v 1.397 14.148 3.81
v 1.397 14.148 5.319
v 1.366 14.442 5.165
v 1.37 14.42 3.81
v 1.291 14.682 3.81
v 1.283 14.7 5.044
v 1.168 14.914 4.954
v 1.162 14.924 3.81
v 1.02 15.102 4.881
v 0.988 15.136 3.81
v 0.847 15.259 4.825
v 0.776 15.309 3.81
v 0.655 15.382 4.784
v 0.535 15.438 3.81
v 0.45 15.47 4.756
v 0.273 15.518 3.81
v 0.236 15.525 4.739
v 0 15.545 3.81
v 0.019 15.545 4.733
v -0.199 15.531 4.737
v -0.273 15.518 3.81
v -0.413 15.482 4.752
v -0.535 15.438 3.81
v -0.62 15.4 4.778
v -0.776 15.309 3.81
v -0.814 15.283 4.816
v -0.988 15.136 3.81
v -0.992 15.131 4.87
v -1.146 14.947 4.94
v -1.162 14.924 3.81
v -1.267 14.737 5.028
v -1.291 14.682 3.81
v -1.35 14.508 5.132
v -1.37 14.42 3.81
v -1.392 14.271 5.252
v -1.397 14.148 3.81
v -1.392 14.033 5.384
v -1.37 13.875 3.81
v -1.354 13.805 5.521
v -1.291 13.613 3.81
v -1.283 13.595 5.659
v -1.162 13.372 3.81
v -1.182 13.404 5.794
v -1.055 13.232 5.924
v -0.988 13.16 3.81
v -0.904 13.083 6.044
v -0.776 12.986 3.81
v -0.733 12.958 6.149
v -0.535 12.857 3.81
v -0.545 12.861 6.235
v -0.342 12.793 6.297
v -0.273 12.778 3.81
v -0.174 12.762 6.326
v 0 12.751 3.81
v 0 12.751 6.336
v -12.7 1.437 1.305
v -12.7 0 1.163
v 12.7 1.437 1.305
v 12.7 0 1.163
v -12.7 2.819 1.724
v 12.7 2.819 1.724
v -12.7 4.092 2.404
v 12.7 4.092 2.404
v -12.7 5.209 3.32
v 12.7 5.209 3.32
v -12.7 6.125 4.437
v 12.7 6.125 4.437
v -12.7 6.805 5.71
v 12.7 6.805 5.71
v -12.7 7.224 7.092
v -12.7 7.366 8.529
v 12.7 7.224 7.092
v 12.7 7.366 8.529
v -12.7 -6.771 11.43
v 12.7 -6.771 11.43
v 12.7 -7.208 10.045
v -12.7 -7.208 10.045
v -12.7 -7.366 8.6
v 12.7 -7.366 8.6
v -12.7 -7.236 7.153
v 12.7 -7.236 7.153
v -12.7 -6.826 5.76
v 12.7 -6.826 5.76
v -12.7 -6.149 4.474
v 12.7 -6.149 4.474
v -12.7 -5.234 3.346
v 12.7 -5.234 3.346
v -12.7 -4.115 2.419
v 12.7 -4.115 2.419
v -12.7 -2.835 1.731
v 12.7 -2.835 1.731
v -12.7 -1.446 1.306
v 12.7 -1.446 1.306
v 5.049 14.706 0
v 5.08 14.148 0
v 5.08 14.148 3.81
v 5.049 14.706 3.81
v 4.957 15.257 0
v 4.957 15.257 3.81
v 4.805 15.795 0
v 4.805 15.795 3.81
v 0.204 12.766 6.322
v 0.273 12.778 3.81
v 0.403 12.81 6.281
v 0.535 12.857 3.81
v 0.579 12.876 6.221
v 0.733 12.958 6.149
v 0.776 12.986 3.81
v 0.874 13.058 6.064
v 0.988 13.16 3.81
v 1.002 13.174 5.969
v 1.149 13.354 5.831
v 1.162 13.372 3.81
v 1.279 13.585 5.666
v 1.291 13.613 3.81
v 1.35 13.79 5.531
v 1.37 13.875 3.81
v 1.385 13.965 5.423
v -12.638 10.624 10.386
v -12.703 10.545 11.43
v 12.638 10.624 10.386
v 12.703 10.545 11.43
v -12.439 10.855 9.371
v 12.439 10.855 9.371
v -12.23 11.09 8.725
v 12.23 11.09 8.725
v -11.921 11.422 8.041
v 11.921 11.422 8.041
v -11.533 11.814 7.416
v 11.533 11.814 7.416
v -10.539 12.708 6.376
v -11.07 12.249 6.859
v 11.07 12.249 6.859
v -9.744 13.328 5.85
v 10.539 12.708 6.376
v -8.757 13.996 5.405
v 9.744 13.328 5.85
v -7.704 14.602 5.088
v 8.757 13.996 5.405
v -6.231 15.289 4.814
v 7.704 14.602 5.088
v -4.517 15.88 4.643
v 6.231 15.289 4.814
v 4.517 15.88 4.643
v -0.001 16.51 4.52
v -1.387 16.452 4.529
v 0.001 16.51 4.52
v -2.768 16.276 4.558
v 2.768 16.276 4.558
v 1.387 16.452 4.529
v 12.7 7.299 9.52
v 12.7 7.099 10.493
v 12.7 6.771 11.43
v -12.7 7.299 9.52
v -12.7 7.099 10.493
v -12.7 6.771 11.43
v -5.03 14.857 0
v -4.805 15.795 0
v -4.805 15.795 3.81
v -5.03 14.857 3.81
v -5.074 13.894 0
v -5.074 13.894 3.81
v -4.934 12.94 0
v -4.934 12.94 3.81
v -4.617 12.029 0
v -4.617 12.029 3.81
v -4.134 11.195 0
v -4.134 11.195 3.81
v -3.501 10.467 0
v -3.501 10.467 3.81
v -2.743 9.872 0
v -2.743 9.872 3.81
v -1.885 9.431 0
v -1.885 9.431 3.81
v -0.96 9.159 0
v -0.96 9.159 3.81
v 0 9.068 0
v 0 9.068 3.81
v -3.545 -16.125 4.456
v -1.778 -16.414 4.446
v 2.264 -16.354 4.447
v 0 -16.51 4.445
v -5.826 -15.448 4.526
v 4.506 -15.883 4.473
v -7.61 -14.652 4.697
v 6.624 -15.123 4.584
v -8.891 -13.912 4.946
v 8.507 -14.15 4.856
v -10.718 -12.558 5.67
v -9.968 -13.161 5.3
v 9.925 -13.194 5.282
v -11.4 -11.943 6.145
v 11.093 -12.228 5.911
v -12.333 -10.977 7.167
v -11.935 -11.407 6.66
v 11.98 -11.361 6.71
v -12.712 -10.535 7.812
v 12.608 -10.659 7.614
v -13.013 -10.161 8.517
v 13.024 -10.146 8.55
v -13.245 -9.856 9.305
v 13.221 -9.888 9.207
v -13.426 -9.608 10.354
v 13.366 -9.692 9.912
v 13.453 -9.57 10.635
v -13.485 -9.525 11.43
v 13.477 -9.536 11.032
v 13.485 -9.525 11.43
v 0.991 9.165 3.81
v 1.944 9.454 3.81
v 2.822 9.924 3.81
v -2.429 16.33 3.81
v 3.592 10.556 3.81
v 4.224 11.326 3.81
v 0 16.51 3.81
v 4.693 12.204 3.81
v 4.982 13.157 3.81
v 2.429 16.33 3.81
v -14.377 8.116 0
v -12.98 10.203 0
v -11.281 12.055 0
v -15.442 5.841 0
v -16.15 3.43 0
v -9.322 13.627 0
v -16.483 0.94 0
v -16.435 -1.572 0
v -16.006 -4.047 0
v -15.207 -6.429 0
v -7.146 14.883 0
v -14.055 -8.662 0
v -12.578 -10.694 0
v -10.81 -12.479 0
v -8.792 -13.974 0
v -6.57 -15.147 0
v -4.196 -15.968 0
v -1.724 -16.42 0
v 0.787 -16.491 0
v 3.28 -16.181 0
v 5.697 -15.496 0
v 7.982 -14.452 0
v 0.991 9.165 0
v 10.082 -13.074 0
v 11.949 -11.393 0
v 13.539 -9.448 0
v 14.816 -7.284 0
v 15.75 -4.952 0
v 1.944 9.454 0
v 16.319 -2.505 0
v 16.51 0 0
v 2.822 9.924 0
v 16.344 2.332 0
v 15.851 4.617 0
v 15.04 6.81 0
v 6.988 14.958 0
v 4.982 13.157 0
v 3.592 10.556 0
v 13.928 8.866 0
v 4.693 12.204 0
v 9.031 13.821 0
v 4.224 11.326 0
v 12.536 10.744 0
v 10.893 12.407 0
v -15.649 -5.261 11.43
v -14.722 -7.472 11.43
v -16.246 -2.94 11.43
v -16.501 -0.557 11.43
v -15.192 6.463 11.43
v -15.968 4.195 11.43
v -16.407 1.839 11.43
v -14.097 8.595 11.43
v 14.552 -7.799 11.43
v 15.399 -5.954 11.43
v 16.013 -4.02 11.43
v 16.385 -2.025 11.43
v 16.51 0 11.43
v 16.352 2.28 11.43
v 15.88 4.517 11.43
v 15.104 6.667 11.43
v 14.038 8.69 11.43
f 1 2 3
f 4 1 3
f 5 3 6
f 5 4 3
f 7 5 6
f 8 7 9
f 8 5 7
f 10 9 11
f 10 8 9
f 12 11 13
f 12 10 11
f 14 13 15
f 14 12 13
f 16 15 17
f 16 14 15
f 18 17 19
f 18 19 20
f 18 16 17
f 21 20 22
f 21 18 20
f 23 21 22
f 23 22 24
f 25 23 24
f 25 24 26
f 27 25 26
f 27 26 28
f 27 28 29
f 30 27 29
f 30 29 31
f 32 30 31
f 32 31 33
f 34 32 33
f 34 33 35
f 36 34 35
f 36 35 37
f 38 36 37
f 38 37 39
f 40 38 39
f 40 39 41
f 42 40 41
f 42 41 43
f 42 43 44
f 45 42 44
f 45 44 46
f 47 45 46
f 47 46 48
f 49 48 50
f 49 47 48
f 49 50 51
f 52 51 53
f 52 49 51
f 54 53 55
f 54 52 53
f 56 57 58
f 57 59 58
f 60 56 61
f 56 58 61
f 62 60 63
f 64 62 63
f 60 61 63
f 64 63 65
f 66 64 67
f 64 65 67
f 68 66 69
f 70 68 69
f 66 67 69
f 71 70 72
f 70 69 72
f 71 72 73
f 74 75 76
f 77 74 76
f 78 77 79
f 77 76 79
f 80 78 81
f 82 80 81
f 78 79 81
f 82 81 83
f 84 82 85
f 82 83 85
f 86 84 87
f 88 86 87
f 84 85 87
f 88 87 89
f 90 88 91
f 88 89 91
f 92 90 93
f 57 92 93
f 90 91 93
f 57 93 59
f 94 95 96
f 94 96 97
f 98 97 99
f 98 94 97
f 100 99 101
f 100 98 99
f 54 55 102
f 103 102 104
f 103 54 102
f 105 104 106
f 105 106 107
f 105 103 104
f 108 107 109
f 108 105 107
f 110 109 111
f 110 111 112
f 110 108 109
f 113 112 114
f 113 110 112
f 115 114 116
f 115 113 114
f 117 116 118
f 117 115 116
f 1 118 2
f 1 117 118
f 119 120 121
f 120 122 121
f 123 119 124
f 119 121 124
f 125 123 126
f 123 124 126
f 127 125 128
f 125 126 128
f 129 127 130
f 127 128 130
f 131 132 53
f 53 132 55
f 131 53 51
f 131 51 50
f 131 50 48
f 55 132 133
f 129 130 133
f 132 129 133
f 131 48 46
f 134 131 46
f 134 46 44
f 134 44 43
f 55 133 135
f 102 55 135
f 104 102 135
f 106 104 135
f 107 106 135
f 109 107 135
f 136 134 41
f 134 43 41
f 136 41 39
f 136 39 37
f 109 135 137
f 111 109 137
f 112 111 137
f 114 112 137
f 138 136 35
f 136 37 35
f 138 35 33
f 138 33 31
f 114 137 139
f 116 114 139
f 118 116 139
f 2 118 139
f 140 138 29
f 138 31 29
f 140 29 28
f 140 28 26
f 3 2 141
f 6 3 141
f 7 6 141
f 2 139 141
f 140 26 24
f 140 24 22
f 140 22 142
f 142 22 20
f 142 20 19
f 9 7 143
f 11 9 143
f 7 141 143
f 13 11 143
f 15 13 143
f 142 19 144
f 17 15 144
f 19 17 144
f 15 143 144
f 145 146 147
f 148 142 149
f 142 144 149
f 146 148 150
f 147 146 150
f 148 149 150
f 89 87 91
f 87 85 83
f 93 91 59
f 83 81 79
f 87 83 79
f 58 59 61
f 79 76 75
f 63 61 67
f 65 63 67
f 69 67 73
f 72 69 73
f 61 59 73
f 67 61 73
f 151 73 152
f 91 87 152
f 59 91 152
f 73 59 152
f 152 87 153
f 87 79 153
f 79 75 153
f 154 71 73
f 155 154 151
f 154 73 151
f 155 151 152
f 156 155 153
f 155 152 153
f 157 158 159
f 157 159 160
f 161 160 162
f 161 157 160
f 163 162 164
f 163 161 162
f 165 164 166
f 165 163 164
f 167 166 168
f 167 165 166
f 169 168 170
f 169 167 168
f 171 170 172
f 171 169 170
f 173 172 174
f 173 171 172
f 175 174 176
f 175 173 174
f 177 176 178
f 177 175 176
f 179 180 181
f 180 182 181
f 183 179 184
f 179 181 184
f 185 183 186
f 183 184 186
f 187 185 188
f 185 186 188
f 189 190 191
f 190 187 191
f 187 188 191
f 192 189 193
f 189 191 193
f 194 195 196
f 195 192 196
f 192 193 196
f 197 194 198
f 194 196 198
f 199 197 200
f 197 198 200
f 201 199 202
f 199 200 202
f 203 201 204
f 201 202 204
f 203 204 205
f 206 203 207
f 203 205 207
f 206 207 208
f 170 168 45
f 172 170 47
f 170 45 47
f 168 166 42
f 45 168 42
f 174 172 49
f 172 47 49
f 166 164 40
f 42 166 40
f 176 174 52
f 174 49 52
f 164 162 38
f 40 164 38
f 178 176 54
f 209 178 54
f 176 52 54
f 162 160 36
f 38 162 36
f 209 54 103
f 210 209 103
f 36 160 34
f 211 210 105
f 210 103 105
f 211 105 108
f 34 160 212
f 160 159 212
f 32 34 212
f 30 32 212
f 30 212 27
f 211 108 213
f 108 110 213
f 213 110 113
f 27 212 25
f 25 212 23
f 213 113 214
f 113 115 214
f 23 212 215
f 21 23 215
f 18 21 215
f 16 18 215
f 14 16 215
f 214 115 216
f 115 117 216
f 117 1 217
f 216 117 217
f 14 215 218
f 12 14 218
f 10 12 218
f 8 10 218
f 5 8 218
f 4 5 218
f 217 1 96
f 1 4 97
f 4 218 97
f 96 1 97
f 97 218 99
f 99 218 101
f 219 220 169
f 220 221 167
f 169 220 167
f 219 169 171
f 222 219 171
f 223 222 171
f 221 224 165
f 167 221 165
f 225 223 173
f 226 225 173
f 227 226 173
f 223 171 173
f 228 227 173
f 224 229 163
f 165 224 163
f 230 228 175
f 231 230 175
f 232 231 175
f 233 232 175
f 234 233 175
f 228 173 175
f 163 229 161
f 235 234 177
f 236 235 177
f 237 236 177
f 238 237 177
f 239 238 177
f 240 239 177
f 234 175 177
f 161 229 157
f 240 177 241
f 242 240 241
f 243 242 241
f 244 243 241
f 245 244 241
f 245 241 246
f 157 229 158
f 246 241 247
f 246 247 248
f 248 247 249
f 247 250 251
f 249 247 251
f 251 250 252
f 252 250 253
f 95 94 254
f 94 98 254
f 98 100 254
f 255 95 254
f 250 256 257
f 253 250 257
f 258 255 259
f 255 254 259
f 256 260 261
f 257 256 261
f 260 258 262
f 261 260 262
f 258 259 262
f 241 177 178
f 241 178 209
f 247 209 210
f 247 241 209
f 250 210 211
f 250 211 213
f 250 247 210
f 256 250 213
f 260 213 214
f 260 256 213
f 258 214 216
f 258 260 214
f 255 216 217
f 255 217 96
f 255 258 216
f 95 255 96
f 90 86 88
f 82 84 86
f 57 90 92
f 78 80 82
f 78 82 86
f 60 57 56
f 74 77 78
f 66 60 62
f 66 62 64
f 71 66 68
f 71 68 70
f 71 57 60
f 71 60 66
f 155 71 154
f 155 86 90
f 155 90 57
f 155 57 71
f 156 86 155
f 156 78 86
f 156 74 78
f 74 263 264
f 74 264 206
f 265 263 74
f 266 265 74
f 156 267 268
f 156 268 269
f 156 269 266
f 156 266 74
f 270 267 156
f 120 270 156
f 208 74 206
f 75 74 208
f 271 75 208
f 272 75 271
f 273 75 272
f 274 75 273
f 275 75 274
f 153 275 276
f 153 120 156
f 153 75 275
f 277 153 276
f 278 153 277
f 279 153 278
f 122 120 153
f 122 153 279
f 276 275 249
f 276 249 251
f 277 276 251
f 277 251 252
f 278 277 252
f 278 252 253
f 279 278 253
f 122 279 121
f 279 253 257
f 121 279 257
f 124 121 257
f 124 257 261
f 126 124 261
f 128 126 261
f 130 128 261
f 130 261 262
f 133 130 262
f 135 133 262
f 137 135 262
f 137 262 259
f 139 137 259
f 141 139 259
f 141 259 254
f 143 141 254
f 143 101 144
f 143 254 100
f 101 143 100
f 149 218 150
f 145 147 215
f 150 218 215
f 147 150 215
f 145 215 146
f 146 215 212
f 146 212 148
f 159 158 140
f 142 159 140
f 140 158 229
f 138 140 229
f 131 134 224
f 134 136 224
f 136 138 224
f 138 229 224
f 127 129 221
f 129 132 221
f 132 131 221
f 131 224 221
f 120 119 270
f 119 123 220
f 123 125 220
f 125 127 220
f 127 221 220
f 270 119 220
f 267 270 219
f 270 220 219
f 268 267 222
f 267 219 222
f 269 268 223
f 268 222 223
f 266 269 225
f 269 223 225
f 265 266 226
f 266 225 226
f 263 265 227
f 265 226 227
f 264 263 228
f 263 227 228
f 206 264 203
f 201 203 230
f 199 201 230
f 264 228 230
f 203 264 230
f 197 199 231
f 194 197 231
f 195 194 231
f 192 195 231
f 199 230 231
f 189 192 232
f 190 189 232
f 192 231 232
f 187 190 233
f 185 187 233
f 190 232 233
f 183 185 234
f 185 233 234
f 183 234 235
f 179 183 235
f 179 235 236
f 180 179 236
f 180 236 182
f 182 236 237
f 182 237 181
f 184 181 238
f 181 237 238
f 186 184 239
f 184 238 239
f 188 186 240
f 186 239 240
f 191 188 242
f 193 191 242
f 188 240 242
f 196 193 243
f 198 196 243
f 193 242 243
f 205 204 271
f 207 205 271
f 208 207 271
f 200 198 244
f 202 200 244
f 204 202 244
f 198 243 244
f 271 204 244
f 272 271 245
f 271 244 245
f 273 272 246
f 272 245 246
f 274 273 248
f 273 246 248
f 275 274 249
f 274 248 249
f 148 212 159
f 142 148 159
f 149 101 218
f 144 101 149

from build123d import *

# Parameters (mm, degrees)
F0_R      = 16.51
F1_DEPTH  = 11.43
F3_DEPTH  = 12.7
F5_DEPTH  = 3.81
F7_DEPTH  = 11.43
F9_DEPTH  = 25.4
F11_DEPTH = 25.4


with BuildPart() as f1:
    # F0 (on Top) → F1 (new body)
    with BuildSketch(Plane.XY):
        Circle(F0_R)
    extrude(amount=F1_DEPTH)

    # F2 (on Right) → F3 (cut, symmetric)
    with BuildSketch(Plane.YZ):
        with BuildLine():
            ThreePointArc((0, 1.162998), (5.208549, 3.32045), (7.366, 8.528998))
            ThreePointArc((7.366, 8.528998), (-5.208549, 13.737547), (0, 1.162998))
        make_face()
    extrude(amount=F3_DEPTH, both=True, mode=Mode.SUBTRACT)

    # F4 (on Top) → F5 (cut)
    with BuildSketch(Plane.XY):
        with BuildLine():
            ThreePointArc((0, 9.0678), (3.592102, 10.555698), (5.08, 14.1478))
            ThreePointArc((5.08, 14.1478), (-3.592102, 17.739902), (0, 9.0678))
        make_face()
    extrude(amount=F5_DEPTH, mode=Mode.SUBTRACT)

    # F6 (on Top) → F7 (cut, through all)
    with BuildSketch(Plane.XY):
        with BuildLine():
            ThreePointArc((0, 12.7508), (0.987828, 13.159972), (1.397, 14.1478))
            ThreePointArc((1.397, 14.1478), (-0.987828, 15.135628), (0, 12.7508))
        make_face()
    extrude(amount=F7_DEPTH, mode=Mode.SUBTRACT)

    # F8 (on Right) → F9 (cut, symmetric)
    with BuildSketch(Plane.YZ):
        with BuildLine():
            ThreePointArc((-16.51, 4.445), (-11.570859, 6.490859), (-9.525, 11.43))
            ThreePointArc((-9.525, 11.43), (-21.449141, 16.369141), (-16.51, 4.445))
        make_face()
    extrude(amount=F9_DEPTH, both=True, mode=Mode.SUBTRACT)

    # F10 (on Right) → F11 (cut, symmetric)
    with BuildSketch(Plane.YZ):
        with BuildLine():
            ThreePointArc((16.51, 4.519911), (22.094443, 6.142438), (24.515244, 11.43))
            ThreePointArc((24.515244, 11.43), (12.966045, 16.717562), (16.51, 4.519911))
        make_face()
    extrude(amount=F11_DEPTH, both=True, mode=Mode.SUBTRACT)


solid = f1.part
